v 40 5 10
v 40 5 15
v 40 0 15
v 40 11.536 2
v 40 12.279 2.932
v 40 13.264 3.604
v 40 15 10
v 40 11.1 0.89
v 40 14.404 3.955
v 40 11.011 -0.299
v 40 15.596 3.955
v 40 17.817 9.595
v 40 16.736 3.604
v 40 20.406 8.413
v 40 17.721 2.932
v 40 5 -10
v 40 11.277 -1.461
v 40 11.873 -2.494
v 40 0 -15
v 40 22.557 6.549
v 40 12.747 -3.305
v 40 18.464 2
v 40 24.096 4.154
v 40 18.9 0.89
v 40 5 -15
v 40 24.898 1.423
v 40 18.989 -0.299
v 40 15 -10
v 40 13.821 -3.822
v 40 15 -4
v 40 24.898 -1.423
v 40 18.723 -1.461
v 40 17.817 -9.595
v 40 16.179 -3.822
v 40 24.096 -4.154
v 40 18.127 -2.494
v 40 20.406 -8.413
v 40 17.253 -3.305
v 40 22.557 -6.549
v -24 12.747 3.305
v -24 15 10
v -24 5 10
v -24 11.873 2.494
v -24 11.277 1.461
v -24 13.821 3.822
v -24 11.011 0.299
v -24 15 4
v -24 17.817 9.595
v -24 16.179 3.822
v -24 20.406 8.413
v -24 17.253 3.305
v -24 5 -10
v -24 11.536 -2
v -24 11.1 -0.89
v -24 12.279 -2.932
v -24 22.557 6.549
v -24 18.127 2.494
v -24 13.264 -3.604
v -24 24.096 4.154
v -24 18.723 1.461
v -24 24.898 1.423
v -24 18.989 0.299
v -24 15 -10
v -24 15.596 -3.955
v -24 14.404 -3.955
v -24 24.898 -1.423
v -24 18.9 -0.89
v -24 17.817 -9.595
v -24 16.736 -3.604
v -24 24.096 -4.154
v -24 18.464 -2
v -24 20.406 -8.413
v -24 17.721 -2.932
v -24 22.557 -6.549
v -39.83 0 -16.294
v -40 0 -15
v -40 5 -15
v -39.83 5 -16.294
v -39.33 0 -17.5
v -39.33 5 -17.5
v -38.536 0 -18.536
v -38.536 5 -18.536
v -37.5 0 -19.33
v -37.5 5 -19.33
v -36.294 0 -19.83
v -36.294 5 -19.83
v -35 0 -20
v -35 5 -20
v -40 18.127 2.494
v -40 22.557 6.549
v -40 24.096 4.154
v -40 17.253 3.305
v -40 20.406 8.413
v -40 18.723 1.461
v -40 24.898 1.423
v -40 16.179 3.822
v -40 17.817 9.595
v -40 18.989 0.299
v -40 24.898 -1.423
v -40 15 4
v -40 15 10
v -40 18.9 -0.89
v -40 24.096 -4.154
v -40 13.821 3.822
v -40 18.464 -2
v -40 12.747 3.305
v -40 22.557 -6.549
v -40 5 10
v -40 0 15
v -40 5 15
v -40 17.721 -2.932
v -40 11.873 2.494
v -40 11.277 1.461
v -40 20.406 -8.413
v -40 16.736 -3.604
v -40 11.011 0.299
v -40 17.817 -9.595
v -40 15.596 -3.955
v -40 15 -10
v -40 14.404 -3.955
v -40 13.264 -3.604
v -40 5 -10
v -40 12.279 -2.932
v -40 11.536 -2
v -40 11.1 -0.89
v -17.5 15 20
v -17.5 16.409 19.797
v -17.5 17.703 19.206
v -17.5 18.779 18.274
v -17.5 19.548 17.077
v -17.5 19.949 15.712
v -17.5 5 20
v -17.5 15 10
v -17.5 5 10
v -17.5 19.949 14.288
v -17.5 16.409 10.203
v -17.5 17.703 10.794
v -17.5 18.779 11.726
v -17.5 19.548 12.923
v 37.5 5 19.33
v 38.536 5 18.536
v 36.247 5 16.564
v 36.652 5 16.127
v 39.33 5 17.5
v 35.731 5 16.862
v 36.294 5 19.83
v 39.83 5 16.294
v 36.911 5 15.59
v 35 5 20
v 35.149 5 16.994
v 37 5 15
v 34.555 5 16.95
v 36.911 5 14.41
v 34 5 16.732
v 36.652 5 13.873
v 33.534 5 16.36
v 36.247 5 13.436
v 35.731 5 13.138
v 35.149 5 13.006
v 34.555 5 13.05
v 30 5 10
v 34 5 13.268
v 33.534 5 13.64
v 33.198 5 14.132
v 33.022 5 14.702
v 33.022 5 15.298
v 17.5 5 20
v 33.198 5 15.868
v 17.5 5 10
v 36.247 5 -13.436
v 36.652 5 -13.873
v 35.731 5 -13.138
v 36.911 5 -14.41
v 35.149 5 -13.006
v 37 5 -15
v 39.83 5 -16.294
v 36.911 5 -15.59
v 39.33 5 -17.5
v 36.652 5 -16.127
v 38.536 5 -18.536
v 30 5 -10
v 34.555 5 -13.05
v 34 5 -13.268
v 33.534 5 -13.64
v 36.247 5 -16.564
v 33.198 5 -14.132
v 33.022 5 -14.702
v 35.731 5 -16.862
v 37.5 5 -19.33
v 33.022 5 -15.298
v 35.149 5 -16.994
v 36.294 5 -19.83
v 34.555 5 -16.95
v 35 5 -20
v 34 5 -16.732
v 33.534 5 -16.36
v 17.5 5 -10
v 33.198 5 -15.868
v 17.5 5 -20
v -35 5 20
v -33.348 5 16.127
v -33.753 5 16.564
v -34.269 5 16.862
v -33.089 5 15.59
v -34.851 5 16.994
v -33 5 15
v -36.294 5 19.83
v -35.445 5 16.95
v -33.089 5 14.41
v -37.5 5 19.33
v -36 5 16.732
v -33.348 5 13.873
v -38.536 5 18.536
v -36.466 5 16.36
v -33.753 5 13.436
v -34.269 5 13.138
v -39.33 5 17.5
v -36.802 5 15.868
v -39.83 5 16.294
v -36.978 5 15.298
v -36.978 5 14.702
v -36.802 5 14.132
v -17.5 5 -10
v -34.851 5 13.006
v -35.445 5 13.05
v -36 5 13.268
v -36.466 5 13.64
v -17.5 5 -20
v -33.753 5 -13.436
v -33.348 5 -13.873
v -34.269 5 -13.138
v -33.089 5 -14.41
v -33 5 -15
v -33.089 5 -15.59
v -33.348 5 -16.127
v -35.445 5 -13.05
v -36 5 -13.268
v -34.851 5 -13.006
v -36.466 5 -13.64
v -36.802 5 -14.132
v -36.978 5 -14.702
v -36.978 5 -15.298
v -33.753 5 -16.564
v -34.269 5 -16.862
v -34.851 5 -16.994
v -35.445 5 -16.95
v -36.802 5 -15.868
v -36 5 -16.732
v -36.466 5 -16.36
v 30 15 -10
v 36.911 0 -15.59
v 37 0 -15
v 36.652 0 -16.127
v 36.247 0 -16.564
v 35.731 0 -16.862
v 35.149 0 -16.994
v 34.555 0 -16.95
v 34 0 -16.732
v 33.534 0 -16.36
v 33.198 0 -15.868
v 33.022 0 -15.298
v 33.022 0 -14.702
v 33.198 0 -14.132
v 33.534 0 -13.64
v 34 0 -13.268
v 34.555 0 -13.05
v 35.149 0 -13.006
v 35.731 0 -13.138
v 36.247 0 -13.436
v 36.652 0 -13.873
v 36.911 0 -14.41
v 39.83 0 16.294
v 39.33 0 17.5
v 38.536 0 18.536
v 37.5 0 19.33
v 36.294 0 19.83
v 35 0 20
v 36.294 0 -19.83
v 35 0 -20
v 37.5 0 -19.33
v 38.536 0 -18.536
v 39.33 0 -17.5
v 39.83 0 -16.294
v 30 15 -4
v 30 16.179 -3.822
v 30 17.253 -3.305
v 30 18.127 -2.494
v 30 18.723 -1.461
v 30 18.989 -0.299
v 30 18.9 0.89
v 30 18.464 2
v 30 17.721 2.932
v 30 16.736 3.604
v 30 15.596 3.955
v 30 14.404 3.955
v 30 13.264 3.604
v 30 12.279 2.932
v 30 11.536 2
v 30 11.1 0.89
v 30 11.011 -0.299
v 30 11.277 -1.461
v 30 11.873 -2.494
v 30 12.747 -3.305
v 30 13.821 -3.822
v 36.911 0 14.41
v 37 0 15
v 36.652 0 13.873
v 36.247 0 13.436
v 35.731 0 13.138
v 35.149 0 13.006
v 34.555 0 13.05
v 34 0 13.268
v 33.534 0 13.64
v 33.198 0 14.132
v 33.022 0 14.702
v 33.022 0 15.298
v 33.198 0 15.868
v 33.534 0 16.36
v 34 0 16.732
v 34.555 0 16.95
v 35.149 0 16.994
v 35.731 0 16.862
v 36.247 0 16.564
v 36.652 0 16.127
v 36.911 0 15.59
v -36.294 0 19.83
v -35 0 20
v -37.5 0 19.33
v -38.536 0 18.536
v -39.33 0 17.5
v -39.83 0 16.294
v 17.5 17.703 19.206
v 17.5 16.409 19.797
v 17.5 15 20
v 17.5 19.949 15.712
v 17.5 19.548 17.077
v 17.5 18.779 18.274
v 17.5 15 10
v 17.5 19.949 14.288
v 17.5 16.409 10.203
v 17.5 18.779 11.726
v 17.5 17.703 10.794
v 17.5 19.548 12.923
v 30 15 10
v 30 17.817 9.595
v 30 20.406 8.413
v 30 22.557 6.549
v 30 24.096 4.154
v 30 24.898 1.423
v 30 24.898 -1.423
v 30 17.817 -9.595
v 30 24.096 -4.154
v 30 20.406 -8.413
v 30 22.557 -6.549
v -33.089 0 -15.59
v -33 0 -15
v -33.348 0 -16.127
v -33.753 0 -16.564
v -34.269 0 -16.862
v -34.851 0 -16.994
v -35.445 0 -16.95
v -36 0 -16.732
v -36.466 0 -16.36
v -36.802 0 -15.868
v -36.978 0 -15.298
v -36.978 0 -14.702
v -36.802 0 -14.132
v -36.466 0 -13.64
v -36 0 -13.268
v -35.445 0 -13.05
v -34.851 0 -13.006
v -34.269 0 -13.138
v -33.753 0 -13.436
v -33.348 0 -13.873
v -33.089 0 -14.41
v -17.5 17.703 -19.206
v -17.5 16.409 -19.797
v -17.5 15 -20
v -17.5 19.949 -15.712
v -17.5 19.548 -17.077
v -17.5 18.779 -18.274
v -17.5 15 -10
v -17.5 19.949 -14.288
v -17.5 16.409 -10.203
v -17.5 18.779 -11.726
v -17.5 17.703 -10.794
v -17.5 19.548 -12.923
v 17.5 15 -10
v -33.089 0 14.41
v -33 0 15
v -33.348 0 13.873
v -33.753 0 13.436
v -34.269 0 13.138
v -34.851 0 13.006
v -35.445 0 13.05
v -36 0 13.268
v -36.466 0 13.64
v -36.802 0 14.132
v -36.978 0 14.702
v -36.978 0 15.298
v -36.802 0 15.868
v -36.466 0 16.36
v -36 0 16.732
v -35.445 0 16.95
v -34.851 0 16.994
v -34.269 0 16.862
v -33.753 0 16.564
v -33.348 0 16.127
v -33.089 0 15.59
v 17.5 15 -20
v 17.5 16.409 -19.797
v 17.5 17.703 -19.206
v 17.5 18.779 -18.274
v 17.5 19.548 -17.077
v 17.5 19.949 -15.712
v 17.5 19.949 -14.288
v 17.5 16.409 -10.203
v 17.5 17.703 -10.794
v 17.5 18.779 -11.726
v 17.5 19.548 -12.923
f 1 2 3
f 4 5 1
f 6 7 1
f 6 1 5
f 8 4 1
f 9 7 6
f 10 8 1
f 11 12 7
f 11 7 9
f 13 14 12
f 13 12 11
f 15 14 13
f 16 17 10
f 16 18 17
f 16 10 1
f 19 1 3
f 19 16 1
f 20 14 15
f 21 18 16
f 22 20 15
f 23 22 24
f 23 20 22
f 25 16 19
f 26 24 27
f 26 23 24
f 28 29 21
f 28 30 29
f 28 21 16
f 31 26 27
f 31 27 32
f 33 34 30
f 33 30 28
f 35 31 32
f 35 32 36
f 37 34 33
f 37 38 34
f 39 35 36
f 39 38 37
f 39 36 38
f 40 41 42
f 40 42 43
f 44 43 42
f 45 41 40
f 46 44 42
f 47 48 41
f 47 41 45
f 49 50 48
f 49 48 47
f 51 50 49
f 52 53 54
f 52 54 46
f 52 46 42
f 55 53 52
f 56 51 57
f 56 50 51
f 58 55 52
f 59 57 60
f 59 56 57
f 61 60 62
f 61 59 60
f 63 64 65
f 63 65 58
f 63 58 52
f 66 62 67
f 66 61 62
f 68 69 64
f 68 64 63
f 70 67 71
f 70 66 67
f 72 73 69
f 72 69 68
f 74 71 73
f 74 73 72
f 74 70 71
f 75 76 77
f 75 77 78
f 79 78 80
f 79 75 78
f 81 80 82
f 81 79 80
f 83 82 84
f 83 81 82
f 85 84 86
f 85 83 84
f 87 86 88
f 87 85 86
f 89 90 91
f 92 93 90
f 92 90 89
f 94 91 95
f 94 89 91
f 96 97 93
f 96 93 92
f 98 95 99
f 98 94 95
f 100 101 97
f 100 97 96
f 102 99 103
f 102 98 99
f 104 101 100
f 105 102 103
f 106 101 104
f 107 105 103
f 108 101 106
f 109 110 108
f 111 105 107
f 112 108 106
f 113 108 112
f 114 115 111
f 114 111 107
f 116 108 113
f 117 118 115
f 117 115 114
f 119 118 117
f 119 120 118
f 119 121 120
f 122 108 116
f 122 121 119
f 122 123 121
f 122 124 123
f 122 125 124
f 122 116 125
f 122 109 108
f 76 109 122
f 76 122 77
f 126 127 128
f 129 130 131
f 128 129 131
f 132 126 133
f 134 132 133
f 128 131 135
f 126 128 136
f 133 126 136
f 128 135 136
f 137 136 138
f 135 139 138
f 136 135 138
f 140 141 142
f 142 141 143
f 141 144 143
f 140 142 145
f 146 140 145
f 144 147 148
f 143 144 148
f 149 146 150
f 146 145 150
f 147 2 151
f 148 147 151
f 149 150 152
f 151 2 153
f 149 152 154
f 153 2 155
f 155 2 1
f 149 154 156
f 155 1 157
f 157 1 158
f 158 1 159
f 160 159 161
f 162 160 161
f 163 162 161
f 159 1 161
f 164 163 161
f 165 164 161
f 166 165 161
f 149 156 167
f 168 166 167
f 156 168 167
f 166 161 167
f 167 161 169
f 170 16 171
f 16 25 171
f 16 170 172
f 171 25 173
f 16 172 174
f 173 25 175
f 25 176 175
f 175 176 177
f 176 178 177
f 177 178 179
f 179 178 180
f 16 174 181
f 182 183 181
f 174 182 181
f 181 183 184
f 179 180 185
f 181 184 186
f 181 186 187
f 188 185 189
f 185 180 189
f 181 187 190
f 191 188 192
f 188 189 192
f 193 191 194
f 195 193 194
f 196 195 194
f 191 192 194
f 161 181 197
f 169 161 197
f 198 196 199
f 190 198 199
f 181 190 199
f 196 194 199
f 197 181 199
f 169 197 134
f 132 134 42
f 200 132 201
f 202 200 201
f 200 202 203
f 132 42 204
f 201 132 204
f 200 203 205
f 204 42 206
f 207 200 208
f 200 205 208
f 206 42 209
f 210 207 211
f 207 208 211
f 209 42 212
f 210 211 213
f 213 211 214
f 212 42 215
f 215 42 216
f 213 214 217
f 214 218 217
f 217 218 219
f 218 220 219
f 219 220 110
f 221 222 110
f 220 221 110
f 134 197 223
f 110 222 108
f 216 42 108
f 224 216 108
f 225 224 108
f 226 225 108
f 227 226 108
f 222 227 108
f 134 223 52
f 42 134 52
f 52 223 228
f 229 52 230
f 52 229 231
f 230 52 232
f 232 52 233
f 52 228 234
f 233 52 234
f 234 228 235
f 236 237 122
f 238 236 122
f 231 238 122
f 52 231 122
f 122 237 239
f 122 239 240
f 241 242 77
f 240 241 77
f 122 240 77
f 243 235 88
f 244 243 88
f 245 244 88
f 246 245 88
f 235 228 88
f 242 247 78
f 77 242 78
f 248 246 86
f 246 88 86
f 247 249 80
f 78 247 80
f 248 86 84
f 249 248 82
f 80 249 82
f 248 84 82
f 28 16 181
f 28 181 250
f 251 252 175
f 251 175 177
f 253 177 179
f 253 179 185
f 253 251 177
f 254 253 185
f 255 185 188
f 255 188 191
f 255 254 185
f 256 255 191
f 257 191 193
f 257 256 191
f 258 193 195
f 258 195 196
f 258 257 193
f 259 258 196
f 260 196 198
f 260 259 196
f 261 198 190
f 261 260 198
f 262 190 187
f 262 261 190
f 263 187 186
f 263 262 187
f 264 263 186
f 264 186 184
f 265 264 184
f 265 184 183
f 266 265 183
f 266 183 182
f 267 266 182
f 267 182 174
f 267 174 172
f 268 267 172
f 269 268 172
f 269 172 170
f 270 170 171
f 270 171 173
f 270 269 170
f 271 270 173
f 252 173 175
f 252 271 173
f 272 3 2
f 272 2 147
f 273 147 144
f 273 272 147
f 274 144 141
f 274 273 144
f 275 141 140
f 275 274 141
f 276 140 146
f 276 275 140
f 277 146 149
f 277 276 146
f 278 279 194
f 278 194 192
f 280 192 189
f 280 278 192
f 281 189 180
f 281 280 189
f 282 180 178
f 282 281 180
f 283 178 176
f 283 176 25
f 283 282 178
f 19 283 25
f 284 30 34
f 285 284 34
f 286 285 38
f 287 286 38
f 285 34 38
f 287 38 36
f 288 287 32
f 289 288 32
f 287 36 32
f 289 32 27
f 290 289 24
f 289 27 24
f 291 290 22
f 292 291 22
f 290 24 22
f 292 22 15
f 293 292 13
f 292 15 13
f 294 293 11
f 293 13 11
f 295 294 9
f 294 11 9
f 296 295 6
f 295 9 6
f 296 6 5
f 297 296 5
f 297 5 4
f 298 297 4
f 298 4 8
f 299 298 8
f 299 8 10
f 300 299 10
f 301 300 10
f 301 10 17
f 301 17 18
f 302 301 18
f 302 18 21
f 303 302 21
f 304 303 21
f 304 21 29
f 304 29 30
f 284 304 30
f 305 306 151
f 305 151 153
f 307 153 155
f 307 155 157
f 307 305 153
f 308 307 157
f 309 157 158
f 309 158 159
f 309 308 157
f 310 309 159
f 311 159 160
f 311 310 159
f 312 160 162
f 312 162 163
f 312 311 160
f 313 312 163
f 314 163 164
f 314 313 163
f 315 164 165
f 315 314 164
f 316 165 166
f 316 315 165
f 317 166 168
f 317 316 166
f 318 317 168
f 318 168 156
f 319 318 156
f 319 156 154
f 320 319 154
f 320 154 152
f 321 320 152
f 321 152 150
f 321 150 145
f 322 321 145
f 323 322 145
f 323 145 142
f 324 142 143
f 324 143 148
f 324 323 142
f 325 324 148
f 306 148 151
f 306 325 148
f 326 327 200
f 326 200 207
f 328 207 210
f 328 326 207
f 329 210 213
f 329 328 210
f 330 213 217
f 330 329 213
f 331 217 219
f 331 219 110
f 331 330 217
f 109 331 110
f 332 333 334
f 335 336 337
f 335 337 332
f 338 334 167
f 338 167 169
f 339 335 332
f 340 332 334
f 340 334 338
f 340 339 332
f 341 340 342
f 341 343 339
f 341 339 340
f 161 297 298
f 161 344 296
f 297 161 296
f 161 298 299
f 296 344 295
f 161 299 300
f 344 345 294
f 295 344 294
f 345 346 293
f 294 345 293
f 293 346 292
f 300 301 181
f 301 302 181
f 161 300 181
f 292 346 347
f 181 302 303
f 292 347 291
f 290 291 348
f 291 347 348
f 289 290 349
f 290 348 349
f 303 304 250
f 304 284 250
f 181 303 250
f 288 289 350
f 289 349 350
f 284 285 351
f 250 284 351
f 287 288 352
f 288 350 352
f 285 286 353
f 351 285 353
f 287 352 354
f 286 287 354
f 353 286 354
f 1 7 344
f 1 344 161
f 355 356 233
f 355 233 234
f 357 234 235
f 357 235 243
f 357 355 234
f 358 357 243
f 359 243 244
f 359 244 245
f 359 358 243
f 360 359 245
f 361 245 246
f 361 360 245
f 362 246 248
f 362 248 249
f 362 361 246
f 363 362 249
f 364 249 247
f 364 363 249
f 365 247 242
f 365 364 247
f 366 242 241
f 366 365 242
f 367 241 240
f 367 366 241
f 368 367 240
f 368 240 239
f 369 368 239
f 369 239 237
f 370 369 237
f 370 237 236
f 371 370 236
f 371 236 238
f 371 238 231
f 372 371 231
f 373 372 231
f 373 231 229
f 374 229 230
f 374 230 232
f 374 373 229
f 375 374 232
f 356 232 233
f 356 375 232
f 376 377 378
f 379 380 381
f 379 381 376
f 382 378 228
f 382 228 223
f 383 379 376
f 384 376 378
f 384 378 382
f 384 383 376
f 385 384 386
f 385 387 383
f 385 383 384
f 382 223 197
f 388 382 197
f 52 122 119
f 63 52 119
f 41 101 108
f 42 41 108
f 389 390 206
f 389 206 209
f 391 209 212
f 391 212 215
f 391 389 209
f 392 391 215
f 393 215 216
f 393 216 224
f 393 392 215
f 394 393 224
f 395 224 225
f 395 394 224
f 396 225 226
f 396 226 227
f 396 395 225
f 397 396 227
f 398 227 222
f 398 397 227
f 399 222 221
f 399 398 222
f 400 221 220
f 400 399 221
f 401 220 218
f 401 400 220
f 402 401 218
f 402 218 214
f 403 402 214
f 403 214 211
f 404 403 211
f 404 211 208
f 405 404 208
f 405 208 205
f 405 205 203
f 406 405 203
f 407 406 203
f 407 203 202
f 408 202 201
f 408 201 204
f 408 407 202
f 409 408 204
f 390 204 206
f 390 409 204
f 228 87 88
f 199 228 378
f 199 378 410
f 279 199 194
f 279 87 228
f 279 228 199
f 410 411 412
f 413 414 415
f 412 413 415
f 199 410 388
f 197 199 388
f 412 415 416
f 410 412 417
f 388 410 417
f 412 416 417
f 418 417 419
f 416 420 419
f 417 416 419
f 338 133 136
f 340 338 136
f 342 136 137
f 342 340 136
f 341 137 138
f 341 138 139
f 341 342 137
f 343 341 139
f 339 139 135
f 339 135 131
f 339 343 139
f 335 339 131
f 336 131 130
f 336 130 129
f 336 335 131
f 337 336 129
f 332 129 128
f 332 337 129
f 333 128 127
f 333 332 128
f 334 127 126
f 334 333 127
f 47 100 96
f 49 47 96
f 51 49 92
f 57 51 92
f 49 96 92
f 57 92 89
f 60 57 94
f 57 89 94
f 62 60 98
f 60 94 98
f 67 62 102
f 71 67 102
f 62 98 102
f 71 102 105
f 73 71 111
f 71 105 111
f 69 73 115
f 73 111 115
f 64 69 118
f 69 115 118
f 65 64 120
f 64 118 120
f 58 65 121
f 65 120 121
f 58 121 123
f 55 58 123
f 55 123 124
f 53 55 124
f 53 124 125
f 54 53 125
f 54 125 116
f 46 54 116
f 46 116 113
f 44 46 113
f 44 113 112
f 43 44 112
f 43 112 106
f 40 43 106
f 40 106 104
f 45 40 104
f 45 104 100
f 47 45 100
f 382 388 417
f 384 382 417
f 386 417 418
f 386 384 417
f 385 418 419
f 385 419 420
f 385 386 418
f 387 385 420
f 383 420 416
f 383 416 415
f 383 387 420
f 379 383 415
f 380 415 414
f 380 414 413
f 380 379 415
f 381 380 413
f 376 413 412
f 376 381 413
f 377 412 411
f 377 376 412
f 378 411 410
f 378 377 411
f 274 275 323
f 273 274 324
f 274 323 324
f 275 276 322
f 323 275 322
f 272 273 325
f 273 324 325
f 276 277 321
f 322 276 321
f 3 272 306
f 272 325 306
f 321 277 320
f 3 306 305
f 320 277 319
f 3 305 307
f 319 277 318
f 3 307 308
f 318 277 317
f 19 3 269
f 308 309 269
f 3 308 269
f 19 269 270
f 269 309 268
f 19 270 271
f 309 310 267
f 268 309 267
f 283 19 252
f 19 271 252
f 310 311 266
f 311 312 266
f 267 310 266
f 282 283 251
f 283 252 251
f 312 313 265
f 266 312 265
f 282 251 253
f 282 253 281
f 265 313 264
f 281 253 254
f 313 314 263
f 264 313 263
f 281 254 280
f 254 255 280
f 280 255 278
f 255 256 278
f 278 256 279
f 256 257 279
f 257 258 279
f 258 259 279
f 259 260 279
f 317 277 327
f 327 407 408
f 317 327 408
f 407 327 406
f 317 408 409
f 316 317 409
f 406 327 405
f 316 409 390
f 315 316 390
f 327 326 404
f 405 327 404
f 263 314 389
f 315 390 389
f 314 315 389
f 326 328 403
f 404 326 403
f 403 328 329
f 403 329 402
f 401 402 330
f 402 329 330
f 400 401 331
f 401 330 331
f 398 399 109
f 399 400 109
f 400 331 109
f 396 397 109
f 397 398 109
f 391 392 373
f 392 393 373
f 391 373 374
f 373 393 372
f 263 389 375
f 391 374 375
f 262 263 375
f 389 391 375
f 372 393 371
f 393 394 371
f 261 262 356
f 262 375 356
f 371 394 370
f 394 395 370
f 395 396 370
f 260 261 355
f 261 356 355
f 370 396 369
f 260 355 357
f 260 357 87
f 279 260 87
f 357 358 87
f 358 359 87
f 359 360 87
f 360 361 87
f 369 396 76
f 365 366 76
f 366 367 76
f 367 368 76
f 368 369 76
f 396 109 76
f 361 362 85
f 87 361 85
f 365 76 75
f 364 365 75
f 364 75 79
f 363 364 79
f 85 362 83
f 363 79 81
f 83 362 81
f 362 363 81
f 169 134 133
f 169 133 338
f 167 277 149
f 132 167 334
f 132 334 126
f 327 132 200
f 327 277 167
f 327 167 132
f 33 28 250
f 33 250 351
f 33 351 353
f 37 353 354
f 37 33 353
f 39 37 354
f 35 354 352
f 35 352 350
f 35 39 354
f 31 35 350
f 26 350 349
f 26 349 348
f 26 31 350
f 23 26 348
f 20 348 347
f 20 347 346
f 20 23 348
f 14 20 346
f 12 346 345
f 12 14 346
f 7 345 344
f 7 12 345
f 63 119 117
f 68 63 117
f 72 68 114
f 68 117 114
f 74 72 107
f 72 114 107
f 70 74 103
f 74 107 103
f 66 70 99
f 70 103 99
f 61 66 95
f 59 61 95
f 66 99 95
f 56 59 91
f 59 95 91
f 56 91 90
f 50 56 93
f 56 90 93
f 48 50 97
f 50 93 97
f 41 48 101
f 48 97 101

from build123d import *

# Parameters (mm, degrees)
SKETCH1_R           = 2
BOSS_EXTRUDE1_DEPTH = 5
BOSS_EXTRUDE2_DEPTH = 10
SKETCH3_R           = 4
CUT_EXTRUDE1_DEPTH  = 16
BOSS_EXTRUDE3_DEPTH = 16
SKETCH5_R           = 4
CUT_EXTRUDE2_DEPTH  = 23
SKETCH7_W           = 35
SKETCH7_H           = 10
BOSS_EXTRUDE4_DEPTH = 10
BOSS_EXTRUDE5_DEPTH = 35
SKETCH10_W          = 35
SKETCH10_H          = 10
BOSS_EXTRUDE6_DEPTH = 10
BOSS_EXTRUDE7_DEPTH = 35


with BuildPart() as part:
    # Sketch1 → Boss-Extrude1 (new body)
    with BuildSketch(Plane(origin=(0, 0, 0), x_dir=(1, 0, 0), z_dir=(0, 1, 0))):
        with BuildLine():
            Line((-35, 20), (35, 20))
            ThreePointArc((35, 20), (38.535533906, 18.535533906), (40, 15))
            Line((40, 15), (40, -15))
            ThreePointArc((40, -15), (38.535533906, -18.535533906), (35, -20))
            Line((35, -20), (-35, -20))
            ThreePointArc((-35, -20), (-38.535533906, -18.535533906), (-40, -15))
            Line((-40, -15), (-40, 15))
            ThreePointArc((-40, 15), (-38.535533906, 18.535533906), (-35, 20))
        make_face()
        with Locations((-35, 15)):
            Circle(SKETCH1_R, mode=Mode.SUBTRACT)
        with Locations((-35, -15)):
            Circle(SKETCH1_R, mode=Mode.SUBTRACT)
        with Locations((35, 15)):
            Circle(SKETCH1_R, mode=Mode.SUBTRACT)
        with Locations((35, -15)):
            Circle(SKETCH1_R, mode=Mode.SUBTRACT)
    extrude(amount=BOSS_EXTRUDE1_DEPTH)

    # Sketch2 → Boss-Extrude2 (add)
    with BuildSketch(Plane(origin=(40, 0, 0), x_dir=(0, 0, -1), z_dir=(1, 0, 0))):
        with BuildLine():
            ThreePointArc((10, 15), (0, 25), (-10, 15))
            Line((-10, 15), (-10, 0))
            Line((-10, 0), (10, 0))
            Line((10, 0), (10, 15))
        make_face()
    extrude(amount=-BOSS_EXTRUDE2_DEPTH)

    # Sketch3 → Cut-Extrude1 (cut)
    with BuildSketch(Plane(origin=(40, 0, 0), x_dir=(0, 0, -1), z_dir=(1, 0, 0))):
        with Locations((0, 15)):
            Circle(SKETCH3_R)
    extrude(amount=-CUT_EXTRUDE1_DEPTH, mode=Mode.SUBTRACT)

    # Sketch4 → Boss-Extrude3 (add)
    with BuildSketch(Plane.ZY.offset(40)):
        with BuildLine():
            Line((0, 0), (-10, 0))
            Line((-10, 0), (-10, 15))
            ThreePointArc((-10, 15), (0, 25), (10, 15))
            Line((10, 15), (10, 0))
            Line((10, 0), (0, 0))
        make_face()
    extrude(amount=-BOSS_EXTRUDE3_DEPTH)

    # Sketch5 → Cut-Extrude2 (cut)
    with BuildSketch(Plane.ZY.offset(40)):
        with Locations((0, 15)):
            Circle(SKETCH5_R)
    extrude(amount=-CUT_EXTRUDE2_DEPTH, mode=Mode.SUBTRACT)

    # Sketch7 → Boss-Extrude4 (add)
    with BuildSketch(Plane(origin=(0, 5, 0), x_dir=(1, 0, 0), z_dir=(0, 1, 0))):
        with Locations((0, 15)):
            Rectangle(SKETCH7_W, SKETCH7_H)
    extrude(amount=BOSS_EXTRUDE4_DEPTH)

    # Sketch8 → Boss-Extrude5 (add)
    with BuildSketch(Plane.ZY.offset(17.5)):
        with BuildLine():
            Line((-20, 15), (-10, 15))
            ThreePointArc((-10, 15), (-15, 20), (-20, 15))
        make_face()
    extrude(amount=-BOSS_EXTRUDE5_DEPTH)

    # Sketch10 → Boss-Extrude6 (add)
    with BuildSketch(Plane(origin=(0, 5, 0), x_dir=(1, 0, 0), z_dir=(0, 1, 0))):
        with Locations((0, -15)):
            Rectangle(SKETCH10_W, SKETCH10_H)
    extrude(amount=BOSS_EXTRUDE6_DEPTH)

    # Sketch11 → Boss-Extrude7 (add)
    with BuildSketch(Plane(origin=(17.5, 0, 0), x_dir=(0, 0, -1), z_dir=(1, 0, 0))):
        with BuildLine():
            Line((-20, 15), (-10, 15))
            ThreePointArc((-10, 15), (-15, 20), (-20, 15))
        make_face()
    extrude(amount=-BOSS_EXTRUDE7_DEPTH)


solid = part.part
